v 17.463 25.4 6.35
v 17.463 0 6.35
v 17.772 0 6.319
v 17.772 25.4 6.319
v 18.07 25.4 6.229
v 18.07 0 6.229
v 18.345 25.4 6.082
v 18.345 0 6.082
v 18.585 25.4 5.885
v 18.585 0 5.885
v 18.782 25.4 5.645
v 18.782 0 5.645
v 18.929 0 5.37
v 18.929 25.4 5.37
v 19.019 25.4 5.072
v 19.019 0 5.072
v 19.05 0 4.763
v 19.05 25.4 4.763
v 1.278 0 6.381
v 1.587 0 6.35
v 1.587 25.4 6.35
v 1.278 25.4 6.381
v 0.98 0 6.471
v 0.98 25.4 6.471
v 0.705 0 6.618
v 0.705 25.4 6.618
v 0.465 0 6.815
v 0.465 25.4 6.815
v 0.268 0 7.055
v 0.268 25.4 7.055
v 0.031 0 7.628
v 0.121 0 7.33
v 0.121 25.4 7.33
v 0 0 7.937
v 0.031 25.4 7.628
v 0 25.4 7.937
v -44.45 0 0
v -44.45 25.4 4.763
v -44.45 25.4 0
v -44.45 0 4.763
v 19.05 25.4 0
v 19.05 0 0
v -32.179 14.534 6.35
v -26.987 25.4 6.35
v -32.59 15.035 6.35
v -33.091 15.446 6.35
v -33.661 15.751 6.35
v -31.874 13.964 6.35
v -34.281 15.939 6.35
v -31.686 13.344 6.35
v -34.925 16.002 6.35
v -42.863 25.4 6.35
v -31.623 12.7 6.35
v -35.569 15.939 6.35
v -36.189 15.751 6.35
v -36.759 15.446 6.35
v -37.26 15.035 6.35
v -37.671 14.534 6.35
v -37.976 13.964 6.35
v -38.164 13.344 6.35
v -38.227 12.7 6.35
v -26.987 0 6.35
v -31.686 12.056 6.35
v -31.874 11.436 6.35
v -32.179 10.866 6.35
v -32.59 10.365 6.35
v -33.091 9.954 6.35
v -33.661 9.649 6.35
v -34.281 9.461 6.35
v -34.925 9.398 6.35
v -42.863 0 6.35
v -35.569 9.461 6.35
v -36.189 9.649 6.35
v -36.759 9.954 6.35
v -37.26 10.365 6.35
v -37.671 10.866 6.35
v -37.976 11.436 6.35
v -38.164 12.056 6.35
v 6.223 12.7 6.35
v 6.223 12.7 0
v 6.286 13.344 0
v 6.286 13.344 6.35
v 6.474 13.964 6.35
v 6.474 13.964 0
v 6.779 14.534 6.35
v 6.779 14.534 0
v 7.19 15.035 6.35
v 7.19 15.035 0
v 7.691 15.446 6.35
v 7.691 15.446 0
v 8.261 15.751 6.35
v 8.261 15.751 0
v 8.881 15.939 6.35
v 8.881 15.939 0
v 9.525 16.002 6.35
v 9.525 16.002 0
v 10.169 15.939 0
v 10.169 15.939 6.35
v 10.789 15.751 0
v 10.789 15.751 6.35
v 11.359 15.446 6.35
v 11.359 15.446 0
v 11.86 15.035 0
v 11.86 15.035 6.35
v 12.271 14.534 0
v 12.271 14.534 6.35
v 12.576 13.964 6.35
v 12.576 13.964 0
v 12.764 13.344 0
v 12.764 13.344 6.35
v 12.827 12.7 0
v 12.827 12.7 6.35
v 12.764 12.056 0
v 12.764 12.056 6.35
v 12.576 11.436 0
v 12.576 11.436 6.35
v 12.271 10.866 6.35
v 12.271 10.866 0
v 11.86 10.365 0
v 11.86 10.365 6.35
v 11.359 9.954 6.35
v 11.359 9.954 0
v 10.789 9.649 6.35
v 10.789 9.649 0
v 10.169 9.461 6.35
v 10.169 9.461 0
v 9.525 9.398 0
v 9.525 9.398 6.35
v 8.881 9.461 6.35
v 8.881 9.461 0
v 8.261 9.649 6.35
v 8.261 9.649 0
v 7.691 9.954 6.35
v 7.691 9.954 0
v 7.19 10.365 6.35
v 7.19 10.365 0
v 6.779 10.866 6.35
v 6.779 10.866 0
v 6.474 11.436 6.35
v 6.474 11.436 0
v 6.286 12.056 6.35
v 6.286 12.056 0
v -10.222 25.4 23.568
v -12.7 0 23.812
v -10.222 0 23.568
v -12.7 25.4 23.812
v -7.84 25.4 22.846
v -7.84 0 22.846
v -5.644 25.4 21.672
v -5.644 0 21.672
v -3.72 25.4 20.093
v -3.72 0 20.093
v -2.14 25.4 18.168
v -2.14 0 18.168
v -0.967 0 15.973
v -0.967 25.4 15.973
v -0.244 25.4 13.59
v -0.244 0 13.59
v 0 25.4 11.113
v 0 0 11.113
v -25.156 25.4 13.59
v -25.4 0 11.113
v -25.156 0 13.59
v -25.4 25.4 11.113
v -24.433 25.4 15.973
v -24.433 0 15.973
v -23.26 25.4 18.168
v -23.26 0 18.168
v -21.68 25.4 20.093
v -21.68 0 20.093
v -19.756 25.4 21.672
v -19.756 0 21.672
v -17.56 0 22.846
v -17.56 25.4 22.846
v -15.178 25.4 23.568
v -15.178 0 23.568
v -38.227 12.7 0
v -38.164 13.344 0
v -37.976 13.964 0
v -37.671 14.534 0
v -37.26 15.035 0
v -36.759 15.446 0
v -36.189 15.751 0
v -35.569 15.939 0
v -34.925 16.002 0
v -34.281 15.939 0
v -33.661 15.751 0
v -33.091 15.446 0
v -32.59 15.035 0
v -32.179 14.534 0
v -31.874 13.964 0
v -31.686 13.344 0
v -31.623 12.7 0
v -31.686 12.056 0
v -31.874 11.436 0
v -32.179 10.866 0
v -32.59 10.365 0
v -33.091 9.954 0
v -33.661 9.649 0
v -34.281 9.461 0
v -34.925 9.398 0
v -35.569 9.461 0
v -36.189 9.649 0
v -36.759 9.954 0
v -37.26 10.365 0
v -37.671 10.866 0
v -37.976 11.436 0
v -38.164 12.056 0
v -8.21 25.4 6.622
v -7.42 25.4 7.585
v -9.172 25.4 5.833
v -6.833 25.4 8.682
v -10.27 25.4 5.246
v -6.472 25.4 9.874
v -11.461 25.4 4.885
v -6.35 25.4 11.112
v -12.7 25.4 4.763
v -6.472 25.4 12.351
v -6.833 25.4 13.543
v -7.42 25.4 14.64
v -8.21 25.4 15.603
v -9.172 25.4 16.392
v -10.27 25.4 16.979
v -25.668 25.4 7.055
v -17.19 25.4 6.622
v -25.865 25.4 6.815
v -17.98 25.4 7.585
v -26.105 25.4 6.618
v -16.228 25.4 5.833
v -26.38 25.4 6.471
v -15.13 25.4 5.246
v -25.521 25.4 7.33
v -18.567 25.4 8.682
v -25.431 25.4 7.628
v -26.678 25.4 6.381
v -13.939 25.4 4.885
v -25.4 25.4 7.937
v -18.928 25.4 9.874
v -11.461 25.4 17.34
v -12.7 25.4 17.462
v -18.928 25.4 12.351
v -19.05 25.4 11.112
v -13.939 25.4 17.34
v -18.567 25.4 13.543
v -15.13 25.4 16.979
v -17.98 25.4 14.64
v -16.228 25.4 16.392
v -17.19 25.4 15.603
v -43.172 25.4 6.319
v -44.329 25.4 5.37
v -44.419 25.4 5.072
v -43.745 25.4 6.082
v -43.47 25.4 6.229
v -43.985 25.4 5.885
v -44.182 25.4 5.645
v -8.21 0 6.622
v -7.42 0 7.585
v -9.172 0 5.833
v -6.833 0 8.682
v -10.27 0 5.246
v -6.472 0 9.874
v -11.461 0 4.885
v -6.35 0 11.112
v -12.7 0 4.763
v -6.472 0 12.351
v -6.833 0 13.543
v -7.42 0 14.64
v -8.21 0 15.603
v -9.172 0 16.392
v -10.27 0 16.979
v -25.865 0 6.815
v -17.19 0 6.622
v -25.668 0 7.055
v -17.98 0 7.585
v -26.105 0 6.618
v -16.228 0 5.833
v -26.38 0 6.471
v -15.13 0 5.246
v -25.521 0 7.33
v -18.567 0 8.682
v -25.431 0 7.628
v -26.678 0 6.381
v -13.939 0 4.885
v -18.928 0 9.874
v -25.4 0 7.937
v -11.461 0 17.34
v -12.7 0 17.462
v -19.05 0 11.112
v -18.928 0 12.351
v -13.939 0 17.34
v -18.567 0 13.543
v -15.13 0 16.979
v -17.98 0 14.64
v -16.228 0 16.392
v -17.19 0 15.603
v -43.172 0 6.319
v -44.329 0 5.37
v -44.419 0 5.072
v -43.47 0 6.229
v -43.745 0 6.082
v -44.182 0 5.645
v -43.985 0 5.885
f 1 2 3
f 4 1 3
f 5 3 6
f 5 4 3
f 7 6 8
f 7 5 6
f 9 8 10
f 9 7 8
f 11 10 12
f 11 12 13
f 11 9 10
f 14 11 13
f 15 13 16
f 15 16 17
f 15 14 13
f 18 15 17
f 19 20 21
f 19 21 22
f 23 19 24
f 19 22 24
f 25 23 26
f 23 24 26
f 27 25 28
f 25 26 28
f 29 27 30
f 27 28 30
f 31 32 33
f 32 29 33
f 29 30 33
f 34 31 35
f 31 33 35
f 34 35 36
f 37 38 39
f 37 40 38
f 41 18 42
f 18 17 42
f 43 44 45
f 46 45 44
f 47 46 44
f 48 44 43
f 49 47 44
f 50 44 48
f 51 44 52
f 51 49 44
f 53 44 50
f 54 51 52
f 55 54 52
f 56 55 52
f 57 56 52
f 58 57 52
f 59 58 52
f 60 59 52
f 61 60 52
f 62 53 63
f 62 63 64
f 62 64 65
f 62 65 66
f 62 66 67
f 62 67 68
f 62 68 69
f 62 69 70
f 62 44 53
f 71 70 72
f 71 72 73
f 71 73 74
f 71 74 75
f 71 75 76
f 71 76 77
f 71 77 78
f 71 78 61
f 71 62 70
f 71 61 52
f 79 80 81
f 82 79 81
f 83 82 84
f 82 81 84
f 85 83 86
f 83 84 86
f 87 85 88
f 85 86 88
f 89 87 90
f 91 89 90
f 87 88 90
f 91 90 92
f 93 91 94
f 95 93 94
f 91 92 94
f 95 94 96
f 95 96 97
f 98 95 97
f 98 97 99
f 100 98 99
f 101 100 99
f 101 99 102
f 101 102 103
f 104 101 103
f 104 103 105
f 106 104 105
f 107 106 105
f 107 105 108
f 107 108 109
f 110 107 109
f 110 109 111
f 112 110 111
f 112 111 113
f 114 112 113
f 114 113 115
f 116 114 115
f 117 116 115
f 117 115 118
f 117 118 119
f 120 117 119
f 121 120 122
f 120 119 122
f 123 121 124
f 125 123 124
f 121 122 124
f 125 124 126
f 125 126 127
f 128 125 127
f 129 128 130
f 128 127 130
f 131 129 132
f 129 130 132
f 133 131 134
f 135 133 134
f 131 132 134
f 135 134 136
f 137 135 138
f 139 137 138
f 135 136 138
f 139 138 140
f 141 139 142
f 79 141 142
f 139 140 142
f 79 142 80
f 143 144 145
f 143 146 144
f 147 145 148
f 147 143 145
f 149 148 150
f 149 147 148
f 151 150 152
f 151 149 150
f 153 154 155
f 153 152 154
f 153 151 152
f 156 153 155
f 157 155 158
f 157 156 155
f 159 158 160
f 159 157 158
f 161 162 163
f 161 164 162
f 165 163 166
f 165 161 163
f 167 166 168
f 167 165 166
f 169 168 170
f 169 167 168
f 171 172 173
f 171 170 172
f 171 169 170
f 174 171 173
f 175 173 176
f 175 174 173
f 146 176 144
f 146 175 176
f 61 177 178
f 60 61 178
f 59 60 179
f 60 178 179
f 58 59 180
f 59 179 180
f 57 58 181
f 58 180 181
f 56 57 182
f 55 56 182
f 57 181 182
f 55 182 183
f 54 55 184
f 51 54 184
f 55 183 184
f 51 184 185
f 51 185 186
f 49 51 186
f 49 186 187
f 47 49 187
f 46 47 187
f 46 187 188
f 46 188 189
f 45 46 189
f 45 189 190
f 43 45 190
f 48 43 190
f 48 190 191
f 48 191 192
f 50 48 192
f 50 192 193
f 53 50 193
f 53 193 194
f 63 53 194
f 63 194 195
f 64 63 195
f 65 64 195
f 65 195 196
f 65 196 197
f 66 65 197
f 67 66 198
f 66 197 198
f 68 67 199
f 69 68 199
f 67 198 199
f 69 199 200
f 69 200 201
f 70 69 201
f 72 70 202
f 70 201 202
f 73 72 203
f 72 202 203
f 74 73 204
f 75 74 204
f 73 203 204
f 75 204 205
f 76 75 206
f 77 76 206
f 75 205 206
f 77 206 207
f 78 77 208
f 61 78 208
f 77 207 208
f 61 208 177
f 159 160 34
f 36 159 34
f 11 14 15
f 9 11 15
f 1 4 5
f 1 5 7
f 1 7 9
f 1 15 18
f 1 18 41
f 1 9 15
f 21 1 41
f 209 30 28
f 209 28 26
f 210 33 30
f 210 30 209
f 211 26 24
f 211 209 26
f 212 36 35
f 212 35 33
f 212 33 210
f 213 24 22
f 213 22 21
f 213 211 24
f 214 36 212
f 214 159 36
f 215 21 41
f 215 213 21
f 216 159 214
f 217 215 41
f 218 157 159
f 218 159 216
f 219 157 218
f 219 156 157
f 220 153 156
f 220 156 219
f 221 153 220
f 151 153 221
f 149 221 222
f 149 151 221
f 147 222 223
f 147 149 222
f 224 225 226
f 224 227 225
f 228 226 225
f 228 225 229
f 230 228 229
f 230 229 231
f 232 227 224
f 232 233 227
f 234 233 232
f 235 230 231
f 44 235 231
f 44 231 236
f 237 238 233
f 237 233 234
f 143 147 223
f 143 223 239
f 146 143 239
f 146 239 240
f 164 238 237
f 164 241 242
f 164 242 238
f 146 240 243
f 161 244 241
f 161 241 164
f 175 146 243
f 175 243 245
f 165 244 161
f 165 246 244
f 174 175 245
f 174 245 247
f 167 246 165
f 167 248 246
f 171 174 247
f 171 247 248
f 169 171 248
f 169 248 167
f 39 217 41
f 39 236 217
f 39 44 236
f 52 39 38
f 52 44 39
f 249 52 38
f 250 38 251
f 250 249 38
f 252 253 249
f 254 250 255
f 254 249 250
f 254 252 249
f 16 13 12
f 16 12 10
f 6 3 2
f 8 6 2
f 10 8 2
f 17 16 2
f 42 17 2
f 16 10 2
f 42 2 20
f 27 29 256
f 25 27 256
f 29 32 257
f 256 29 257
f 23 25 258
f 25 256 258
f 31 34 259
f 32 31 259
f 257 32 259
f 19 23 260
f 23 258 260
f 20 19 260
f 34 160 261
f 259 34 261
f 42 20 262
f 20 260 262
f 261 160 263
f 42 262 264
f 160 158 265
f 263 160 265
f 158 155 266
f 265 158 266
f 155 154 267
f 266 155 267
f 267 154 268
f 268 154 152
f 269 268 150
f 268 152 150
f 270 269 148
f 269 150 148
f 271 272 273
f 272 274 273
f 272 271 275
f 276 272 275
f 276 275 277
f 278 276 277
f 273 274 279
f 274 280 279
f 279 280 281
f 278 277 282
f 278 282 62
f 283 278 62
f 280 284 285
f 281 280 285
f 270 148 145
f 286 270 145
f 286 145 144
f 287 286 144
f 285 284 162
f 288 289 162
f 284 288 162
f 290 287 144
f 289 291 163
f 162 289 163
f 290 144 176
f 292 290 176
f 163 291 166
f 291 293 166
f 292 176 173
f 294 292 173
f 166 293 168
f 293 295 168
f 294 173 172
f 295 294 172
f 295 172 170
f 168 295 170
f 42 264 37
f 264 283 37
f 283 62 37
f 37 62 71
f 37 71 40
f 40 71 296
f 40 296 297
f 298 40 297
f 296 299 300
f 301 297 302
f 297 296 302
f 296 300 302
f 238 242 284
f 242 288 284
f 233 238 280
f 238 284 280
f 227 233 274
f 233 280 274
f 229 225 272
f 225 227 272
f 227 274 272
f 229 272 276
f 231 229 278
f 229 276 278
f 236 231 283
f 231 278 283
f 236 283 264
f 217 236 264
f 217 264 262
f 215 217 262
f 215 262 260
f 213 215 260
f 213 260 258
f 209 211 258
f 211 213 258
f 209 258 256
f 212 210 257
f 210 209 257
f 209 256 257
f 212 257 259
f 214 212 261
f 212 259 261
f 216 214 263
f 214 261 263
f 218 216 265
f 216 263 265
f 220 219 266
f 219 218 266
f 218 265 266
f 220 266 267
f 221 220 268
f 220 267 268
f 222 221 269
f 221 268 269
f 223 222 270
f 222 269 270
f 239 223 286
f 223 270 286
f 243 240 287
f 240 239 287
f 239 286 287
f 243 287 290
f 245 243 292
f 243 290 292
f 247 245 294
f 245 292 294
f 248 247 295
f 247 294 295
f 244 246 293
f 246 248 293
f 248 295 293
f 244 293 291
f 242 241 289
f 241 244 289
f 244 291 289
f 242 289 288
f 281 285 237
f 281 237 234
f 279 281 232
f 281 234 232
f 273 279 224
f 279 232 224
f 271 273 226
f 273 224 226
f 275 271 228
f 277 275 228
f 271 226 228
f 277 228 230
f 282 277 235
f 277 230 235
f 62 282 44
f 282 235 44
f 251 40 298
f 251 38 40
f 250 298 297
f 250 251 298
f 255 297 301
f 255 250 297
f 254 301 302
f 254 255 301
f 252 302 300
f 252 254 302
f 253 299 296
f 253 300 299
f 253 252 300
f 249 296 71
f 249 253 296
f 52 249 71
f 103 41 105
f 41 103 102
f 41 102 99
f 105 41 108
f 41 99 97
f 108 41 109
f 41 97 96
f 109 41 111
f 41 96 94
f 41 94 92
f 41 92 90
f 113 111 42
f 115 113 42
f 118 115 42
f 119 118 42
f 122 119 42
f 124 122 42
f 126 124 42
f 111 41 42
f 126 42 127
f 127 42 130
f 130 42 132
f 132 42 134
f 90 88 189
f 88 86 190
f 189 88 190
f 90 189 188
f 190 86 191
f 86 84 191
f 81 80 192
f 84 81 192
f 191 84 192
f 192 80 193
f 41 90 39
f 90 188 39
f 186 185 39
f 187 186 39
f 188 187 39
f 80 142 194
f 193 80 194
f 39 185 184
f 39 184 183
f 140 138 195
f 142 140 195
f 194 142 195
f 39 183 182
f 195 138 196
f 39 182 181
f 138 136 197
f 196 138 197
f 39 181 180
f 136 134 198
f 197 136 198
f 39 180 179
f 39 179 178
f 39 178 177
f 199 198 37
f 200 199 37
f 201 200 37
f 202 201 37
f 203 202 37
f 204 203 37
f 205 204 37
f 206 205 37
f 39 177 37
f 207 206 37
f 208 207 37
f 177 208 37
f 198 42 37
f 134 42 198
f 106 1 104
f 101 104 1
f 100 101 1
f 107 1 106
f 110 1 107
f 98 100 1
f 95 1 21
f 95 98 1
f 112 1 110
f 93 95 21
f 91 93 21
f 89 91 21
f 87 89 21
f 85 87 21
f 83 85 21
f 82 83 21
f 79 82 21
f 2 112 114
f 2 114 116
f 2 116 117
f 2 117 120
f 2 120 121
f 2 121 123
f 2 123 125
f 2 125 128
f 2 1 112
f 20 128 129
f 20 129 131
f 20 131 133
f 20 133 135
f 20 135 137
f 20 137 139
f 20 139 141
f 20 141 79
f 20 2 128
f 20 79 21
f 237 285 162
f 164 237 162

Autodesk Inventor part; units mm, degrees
ref_plane "YZ Plane" through (0, 0, 0) normal (1, 0, 0) x (0, 1, 0)
ref_plane "XZ Plane" through (0, 0, 0) normal (0, 1, 0) x (-1, 0, 0)
ref_plane "XY Plane" through (0, 0, 0) normal (0, 0, 1) x (1, 0, 0)
sketch "Sketch1" plane through (0, 0, 0) normal (0, 1, 0) x (-1, 0, 0)
  line L0 (0, 0) -> (25.4, 0)
  line L1 (25.4, 0) -> (25.4, 23.8125)
  line L2 (25.4, 23.8125) -> (0, 23.8125)
  line L3 (0, 23.8125) -> (0, 0)
  circle A0 centre (12.7, 11.1125) radius 6.35
  line L4 (12.7, 23.8125) -> (12.7, 0) construction
  line L5 (-19.05, 6.35) -> (-19.05, 0)
  line L6 (-19.05, 0) -> (0, 0)
  line L7 (44.45, 6.35) -> (44.45, 0)
  line L8 (44.45, 0) -> (25.4, 0)
  line L9 (-19.05, 6.35) -> (0, 6.35)
  line L10 (25.4, 6.35) -> (44.45, 6.35)
  dimension "d0" = 25.4
  dimension "d1" = 23.8125
  dimension "d2" = 12.7
  dimension "d9" = 6.35
  dimension "d10" = 19.05
  dimension "d11" = 19.05
  dimension "d12" = 6.35
  dimension "d20" = 11.1125
extrude "Extrusion1" add sketch "Sketch1" along normal blind 25.4
fillet "Fillet1" radius 12.7 2 edges at (-25.4, 12.7, 23.8125) (0, 12.7, 23.8125)
fillet "Fillet1" radius 1.5875 4 edges at (-25.4, 12.7, 6.35) (0, 12.7, 6.35) (-44.45, 12.7, 6.35) (19.05, 12.7, 6.35)
sketch "Sketch2" plane through (19.05, 25.4, 0) normal (0, 0, -1) x (-1, 0, 0)
  line L0 (1.5875, 0) -> (1.5875, -25.4) construction
  line L1 (17.4625, 0) -> (1.5875, 0) construction
  line L2 (17.4625, -25.4) -> (17.4625, 0) construction
  line L3 (61.9125, -25.4) -> (61.9125, 0) construction
  line L4 (46.0375, 0) -> (46.0375, -25.4) construction
  line L5 (61.9125, 0) -> (46.0375, 0) construction
  line L6 (1.5875, -12.7) -> (17.4625, -12.7) construction
  line L7 (46.0375, -12.7) -> (61.9125, -12.7) construction
  circle A0 centre (9.525, -12.7) radius 3.302
  circle A1 centre (53.975, -12.7) radius 3.302
  line L8 (61.9125, -25.4) -> (46.0375, -25.4) projected
  line L9 (17.4625, -25.4) -> (1.5875, -25.4) projected
  point P0 (19.05, -25.4)
  dimension "d15" = 6.604
  dimension "d16" = 6.604
  dimension "d21" = 44.45
extrude "Extrusion3" cut sketch "Sketch2" against normal through all
equation "\"d9\" = d12"
equation "\"d10\" = d11"
equation "\"d16\" = d15"
properties part number "Shaft Mount V1.500 Drivetrain" material "Aluminum 6061"
